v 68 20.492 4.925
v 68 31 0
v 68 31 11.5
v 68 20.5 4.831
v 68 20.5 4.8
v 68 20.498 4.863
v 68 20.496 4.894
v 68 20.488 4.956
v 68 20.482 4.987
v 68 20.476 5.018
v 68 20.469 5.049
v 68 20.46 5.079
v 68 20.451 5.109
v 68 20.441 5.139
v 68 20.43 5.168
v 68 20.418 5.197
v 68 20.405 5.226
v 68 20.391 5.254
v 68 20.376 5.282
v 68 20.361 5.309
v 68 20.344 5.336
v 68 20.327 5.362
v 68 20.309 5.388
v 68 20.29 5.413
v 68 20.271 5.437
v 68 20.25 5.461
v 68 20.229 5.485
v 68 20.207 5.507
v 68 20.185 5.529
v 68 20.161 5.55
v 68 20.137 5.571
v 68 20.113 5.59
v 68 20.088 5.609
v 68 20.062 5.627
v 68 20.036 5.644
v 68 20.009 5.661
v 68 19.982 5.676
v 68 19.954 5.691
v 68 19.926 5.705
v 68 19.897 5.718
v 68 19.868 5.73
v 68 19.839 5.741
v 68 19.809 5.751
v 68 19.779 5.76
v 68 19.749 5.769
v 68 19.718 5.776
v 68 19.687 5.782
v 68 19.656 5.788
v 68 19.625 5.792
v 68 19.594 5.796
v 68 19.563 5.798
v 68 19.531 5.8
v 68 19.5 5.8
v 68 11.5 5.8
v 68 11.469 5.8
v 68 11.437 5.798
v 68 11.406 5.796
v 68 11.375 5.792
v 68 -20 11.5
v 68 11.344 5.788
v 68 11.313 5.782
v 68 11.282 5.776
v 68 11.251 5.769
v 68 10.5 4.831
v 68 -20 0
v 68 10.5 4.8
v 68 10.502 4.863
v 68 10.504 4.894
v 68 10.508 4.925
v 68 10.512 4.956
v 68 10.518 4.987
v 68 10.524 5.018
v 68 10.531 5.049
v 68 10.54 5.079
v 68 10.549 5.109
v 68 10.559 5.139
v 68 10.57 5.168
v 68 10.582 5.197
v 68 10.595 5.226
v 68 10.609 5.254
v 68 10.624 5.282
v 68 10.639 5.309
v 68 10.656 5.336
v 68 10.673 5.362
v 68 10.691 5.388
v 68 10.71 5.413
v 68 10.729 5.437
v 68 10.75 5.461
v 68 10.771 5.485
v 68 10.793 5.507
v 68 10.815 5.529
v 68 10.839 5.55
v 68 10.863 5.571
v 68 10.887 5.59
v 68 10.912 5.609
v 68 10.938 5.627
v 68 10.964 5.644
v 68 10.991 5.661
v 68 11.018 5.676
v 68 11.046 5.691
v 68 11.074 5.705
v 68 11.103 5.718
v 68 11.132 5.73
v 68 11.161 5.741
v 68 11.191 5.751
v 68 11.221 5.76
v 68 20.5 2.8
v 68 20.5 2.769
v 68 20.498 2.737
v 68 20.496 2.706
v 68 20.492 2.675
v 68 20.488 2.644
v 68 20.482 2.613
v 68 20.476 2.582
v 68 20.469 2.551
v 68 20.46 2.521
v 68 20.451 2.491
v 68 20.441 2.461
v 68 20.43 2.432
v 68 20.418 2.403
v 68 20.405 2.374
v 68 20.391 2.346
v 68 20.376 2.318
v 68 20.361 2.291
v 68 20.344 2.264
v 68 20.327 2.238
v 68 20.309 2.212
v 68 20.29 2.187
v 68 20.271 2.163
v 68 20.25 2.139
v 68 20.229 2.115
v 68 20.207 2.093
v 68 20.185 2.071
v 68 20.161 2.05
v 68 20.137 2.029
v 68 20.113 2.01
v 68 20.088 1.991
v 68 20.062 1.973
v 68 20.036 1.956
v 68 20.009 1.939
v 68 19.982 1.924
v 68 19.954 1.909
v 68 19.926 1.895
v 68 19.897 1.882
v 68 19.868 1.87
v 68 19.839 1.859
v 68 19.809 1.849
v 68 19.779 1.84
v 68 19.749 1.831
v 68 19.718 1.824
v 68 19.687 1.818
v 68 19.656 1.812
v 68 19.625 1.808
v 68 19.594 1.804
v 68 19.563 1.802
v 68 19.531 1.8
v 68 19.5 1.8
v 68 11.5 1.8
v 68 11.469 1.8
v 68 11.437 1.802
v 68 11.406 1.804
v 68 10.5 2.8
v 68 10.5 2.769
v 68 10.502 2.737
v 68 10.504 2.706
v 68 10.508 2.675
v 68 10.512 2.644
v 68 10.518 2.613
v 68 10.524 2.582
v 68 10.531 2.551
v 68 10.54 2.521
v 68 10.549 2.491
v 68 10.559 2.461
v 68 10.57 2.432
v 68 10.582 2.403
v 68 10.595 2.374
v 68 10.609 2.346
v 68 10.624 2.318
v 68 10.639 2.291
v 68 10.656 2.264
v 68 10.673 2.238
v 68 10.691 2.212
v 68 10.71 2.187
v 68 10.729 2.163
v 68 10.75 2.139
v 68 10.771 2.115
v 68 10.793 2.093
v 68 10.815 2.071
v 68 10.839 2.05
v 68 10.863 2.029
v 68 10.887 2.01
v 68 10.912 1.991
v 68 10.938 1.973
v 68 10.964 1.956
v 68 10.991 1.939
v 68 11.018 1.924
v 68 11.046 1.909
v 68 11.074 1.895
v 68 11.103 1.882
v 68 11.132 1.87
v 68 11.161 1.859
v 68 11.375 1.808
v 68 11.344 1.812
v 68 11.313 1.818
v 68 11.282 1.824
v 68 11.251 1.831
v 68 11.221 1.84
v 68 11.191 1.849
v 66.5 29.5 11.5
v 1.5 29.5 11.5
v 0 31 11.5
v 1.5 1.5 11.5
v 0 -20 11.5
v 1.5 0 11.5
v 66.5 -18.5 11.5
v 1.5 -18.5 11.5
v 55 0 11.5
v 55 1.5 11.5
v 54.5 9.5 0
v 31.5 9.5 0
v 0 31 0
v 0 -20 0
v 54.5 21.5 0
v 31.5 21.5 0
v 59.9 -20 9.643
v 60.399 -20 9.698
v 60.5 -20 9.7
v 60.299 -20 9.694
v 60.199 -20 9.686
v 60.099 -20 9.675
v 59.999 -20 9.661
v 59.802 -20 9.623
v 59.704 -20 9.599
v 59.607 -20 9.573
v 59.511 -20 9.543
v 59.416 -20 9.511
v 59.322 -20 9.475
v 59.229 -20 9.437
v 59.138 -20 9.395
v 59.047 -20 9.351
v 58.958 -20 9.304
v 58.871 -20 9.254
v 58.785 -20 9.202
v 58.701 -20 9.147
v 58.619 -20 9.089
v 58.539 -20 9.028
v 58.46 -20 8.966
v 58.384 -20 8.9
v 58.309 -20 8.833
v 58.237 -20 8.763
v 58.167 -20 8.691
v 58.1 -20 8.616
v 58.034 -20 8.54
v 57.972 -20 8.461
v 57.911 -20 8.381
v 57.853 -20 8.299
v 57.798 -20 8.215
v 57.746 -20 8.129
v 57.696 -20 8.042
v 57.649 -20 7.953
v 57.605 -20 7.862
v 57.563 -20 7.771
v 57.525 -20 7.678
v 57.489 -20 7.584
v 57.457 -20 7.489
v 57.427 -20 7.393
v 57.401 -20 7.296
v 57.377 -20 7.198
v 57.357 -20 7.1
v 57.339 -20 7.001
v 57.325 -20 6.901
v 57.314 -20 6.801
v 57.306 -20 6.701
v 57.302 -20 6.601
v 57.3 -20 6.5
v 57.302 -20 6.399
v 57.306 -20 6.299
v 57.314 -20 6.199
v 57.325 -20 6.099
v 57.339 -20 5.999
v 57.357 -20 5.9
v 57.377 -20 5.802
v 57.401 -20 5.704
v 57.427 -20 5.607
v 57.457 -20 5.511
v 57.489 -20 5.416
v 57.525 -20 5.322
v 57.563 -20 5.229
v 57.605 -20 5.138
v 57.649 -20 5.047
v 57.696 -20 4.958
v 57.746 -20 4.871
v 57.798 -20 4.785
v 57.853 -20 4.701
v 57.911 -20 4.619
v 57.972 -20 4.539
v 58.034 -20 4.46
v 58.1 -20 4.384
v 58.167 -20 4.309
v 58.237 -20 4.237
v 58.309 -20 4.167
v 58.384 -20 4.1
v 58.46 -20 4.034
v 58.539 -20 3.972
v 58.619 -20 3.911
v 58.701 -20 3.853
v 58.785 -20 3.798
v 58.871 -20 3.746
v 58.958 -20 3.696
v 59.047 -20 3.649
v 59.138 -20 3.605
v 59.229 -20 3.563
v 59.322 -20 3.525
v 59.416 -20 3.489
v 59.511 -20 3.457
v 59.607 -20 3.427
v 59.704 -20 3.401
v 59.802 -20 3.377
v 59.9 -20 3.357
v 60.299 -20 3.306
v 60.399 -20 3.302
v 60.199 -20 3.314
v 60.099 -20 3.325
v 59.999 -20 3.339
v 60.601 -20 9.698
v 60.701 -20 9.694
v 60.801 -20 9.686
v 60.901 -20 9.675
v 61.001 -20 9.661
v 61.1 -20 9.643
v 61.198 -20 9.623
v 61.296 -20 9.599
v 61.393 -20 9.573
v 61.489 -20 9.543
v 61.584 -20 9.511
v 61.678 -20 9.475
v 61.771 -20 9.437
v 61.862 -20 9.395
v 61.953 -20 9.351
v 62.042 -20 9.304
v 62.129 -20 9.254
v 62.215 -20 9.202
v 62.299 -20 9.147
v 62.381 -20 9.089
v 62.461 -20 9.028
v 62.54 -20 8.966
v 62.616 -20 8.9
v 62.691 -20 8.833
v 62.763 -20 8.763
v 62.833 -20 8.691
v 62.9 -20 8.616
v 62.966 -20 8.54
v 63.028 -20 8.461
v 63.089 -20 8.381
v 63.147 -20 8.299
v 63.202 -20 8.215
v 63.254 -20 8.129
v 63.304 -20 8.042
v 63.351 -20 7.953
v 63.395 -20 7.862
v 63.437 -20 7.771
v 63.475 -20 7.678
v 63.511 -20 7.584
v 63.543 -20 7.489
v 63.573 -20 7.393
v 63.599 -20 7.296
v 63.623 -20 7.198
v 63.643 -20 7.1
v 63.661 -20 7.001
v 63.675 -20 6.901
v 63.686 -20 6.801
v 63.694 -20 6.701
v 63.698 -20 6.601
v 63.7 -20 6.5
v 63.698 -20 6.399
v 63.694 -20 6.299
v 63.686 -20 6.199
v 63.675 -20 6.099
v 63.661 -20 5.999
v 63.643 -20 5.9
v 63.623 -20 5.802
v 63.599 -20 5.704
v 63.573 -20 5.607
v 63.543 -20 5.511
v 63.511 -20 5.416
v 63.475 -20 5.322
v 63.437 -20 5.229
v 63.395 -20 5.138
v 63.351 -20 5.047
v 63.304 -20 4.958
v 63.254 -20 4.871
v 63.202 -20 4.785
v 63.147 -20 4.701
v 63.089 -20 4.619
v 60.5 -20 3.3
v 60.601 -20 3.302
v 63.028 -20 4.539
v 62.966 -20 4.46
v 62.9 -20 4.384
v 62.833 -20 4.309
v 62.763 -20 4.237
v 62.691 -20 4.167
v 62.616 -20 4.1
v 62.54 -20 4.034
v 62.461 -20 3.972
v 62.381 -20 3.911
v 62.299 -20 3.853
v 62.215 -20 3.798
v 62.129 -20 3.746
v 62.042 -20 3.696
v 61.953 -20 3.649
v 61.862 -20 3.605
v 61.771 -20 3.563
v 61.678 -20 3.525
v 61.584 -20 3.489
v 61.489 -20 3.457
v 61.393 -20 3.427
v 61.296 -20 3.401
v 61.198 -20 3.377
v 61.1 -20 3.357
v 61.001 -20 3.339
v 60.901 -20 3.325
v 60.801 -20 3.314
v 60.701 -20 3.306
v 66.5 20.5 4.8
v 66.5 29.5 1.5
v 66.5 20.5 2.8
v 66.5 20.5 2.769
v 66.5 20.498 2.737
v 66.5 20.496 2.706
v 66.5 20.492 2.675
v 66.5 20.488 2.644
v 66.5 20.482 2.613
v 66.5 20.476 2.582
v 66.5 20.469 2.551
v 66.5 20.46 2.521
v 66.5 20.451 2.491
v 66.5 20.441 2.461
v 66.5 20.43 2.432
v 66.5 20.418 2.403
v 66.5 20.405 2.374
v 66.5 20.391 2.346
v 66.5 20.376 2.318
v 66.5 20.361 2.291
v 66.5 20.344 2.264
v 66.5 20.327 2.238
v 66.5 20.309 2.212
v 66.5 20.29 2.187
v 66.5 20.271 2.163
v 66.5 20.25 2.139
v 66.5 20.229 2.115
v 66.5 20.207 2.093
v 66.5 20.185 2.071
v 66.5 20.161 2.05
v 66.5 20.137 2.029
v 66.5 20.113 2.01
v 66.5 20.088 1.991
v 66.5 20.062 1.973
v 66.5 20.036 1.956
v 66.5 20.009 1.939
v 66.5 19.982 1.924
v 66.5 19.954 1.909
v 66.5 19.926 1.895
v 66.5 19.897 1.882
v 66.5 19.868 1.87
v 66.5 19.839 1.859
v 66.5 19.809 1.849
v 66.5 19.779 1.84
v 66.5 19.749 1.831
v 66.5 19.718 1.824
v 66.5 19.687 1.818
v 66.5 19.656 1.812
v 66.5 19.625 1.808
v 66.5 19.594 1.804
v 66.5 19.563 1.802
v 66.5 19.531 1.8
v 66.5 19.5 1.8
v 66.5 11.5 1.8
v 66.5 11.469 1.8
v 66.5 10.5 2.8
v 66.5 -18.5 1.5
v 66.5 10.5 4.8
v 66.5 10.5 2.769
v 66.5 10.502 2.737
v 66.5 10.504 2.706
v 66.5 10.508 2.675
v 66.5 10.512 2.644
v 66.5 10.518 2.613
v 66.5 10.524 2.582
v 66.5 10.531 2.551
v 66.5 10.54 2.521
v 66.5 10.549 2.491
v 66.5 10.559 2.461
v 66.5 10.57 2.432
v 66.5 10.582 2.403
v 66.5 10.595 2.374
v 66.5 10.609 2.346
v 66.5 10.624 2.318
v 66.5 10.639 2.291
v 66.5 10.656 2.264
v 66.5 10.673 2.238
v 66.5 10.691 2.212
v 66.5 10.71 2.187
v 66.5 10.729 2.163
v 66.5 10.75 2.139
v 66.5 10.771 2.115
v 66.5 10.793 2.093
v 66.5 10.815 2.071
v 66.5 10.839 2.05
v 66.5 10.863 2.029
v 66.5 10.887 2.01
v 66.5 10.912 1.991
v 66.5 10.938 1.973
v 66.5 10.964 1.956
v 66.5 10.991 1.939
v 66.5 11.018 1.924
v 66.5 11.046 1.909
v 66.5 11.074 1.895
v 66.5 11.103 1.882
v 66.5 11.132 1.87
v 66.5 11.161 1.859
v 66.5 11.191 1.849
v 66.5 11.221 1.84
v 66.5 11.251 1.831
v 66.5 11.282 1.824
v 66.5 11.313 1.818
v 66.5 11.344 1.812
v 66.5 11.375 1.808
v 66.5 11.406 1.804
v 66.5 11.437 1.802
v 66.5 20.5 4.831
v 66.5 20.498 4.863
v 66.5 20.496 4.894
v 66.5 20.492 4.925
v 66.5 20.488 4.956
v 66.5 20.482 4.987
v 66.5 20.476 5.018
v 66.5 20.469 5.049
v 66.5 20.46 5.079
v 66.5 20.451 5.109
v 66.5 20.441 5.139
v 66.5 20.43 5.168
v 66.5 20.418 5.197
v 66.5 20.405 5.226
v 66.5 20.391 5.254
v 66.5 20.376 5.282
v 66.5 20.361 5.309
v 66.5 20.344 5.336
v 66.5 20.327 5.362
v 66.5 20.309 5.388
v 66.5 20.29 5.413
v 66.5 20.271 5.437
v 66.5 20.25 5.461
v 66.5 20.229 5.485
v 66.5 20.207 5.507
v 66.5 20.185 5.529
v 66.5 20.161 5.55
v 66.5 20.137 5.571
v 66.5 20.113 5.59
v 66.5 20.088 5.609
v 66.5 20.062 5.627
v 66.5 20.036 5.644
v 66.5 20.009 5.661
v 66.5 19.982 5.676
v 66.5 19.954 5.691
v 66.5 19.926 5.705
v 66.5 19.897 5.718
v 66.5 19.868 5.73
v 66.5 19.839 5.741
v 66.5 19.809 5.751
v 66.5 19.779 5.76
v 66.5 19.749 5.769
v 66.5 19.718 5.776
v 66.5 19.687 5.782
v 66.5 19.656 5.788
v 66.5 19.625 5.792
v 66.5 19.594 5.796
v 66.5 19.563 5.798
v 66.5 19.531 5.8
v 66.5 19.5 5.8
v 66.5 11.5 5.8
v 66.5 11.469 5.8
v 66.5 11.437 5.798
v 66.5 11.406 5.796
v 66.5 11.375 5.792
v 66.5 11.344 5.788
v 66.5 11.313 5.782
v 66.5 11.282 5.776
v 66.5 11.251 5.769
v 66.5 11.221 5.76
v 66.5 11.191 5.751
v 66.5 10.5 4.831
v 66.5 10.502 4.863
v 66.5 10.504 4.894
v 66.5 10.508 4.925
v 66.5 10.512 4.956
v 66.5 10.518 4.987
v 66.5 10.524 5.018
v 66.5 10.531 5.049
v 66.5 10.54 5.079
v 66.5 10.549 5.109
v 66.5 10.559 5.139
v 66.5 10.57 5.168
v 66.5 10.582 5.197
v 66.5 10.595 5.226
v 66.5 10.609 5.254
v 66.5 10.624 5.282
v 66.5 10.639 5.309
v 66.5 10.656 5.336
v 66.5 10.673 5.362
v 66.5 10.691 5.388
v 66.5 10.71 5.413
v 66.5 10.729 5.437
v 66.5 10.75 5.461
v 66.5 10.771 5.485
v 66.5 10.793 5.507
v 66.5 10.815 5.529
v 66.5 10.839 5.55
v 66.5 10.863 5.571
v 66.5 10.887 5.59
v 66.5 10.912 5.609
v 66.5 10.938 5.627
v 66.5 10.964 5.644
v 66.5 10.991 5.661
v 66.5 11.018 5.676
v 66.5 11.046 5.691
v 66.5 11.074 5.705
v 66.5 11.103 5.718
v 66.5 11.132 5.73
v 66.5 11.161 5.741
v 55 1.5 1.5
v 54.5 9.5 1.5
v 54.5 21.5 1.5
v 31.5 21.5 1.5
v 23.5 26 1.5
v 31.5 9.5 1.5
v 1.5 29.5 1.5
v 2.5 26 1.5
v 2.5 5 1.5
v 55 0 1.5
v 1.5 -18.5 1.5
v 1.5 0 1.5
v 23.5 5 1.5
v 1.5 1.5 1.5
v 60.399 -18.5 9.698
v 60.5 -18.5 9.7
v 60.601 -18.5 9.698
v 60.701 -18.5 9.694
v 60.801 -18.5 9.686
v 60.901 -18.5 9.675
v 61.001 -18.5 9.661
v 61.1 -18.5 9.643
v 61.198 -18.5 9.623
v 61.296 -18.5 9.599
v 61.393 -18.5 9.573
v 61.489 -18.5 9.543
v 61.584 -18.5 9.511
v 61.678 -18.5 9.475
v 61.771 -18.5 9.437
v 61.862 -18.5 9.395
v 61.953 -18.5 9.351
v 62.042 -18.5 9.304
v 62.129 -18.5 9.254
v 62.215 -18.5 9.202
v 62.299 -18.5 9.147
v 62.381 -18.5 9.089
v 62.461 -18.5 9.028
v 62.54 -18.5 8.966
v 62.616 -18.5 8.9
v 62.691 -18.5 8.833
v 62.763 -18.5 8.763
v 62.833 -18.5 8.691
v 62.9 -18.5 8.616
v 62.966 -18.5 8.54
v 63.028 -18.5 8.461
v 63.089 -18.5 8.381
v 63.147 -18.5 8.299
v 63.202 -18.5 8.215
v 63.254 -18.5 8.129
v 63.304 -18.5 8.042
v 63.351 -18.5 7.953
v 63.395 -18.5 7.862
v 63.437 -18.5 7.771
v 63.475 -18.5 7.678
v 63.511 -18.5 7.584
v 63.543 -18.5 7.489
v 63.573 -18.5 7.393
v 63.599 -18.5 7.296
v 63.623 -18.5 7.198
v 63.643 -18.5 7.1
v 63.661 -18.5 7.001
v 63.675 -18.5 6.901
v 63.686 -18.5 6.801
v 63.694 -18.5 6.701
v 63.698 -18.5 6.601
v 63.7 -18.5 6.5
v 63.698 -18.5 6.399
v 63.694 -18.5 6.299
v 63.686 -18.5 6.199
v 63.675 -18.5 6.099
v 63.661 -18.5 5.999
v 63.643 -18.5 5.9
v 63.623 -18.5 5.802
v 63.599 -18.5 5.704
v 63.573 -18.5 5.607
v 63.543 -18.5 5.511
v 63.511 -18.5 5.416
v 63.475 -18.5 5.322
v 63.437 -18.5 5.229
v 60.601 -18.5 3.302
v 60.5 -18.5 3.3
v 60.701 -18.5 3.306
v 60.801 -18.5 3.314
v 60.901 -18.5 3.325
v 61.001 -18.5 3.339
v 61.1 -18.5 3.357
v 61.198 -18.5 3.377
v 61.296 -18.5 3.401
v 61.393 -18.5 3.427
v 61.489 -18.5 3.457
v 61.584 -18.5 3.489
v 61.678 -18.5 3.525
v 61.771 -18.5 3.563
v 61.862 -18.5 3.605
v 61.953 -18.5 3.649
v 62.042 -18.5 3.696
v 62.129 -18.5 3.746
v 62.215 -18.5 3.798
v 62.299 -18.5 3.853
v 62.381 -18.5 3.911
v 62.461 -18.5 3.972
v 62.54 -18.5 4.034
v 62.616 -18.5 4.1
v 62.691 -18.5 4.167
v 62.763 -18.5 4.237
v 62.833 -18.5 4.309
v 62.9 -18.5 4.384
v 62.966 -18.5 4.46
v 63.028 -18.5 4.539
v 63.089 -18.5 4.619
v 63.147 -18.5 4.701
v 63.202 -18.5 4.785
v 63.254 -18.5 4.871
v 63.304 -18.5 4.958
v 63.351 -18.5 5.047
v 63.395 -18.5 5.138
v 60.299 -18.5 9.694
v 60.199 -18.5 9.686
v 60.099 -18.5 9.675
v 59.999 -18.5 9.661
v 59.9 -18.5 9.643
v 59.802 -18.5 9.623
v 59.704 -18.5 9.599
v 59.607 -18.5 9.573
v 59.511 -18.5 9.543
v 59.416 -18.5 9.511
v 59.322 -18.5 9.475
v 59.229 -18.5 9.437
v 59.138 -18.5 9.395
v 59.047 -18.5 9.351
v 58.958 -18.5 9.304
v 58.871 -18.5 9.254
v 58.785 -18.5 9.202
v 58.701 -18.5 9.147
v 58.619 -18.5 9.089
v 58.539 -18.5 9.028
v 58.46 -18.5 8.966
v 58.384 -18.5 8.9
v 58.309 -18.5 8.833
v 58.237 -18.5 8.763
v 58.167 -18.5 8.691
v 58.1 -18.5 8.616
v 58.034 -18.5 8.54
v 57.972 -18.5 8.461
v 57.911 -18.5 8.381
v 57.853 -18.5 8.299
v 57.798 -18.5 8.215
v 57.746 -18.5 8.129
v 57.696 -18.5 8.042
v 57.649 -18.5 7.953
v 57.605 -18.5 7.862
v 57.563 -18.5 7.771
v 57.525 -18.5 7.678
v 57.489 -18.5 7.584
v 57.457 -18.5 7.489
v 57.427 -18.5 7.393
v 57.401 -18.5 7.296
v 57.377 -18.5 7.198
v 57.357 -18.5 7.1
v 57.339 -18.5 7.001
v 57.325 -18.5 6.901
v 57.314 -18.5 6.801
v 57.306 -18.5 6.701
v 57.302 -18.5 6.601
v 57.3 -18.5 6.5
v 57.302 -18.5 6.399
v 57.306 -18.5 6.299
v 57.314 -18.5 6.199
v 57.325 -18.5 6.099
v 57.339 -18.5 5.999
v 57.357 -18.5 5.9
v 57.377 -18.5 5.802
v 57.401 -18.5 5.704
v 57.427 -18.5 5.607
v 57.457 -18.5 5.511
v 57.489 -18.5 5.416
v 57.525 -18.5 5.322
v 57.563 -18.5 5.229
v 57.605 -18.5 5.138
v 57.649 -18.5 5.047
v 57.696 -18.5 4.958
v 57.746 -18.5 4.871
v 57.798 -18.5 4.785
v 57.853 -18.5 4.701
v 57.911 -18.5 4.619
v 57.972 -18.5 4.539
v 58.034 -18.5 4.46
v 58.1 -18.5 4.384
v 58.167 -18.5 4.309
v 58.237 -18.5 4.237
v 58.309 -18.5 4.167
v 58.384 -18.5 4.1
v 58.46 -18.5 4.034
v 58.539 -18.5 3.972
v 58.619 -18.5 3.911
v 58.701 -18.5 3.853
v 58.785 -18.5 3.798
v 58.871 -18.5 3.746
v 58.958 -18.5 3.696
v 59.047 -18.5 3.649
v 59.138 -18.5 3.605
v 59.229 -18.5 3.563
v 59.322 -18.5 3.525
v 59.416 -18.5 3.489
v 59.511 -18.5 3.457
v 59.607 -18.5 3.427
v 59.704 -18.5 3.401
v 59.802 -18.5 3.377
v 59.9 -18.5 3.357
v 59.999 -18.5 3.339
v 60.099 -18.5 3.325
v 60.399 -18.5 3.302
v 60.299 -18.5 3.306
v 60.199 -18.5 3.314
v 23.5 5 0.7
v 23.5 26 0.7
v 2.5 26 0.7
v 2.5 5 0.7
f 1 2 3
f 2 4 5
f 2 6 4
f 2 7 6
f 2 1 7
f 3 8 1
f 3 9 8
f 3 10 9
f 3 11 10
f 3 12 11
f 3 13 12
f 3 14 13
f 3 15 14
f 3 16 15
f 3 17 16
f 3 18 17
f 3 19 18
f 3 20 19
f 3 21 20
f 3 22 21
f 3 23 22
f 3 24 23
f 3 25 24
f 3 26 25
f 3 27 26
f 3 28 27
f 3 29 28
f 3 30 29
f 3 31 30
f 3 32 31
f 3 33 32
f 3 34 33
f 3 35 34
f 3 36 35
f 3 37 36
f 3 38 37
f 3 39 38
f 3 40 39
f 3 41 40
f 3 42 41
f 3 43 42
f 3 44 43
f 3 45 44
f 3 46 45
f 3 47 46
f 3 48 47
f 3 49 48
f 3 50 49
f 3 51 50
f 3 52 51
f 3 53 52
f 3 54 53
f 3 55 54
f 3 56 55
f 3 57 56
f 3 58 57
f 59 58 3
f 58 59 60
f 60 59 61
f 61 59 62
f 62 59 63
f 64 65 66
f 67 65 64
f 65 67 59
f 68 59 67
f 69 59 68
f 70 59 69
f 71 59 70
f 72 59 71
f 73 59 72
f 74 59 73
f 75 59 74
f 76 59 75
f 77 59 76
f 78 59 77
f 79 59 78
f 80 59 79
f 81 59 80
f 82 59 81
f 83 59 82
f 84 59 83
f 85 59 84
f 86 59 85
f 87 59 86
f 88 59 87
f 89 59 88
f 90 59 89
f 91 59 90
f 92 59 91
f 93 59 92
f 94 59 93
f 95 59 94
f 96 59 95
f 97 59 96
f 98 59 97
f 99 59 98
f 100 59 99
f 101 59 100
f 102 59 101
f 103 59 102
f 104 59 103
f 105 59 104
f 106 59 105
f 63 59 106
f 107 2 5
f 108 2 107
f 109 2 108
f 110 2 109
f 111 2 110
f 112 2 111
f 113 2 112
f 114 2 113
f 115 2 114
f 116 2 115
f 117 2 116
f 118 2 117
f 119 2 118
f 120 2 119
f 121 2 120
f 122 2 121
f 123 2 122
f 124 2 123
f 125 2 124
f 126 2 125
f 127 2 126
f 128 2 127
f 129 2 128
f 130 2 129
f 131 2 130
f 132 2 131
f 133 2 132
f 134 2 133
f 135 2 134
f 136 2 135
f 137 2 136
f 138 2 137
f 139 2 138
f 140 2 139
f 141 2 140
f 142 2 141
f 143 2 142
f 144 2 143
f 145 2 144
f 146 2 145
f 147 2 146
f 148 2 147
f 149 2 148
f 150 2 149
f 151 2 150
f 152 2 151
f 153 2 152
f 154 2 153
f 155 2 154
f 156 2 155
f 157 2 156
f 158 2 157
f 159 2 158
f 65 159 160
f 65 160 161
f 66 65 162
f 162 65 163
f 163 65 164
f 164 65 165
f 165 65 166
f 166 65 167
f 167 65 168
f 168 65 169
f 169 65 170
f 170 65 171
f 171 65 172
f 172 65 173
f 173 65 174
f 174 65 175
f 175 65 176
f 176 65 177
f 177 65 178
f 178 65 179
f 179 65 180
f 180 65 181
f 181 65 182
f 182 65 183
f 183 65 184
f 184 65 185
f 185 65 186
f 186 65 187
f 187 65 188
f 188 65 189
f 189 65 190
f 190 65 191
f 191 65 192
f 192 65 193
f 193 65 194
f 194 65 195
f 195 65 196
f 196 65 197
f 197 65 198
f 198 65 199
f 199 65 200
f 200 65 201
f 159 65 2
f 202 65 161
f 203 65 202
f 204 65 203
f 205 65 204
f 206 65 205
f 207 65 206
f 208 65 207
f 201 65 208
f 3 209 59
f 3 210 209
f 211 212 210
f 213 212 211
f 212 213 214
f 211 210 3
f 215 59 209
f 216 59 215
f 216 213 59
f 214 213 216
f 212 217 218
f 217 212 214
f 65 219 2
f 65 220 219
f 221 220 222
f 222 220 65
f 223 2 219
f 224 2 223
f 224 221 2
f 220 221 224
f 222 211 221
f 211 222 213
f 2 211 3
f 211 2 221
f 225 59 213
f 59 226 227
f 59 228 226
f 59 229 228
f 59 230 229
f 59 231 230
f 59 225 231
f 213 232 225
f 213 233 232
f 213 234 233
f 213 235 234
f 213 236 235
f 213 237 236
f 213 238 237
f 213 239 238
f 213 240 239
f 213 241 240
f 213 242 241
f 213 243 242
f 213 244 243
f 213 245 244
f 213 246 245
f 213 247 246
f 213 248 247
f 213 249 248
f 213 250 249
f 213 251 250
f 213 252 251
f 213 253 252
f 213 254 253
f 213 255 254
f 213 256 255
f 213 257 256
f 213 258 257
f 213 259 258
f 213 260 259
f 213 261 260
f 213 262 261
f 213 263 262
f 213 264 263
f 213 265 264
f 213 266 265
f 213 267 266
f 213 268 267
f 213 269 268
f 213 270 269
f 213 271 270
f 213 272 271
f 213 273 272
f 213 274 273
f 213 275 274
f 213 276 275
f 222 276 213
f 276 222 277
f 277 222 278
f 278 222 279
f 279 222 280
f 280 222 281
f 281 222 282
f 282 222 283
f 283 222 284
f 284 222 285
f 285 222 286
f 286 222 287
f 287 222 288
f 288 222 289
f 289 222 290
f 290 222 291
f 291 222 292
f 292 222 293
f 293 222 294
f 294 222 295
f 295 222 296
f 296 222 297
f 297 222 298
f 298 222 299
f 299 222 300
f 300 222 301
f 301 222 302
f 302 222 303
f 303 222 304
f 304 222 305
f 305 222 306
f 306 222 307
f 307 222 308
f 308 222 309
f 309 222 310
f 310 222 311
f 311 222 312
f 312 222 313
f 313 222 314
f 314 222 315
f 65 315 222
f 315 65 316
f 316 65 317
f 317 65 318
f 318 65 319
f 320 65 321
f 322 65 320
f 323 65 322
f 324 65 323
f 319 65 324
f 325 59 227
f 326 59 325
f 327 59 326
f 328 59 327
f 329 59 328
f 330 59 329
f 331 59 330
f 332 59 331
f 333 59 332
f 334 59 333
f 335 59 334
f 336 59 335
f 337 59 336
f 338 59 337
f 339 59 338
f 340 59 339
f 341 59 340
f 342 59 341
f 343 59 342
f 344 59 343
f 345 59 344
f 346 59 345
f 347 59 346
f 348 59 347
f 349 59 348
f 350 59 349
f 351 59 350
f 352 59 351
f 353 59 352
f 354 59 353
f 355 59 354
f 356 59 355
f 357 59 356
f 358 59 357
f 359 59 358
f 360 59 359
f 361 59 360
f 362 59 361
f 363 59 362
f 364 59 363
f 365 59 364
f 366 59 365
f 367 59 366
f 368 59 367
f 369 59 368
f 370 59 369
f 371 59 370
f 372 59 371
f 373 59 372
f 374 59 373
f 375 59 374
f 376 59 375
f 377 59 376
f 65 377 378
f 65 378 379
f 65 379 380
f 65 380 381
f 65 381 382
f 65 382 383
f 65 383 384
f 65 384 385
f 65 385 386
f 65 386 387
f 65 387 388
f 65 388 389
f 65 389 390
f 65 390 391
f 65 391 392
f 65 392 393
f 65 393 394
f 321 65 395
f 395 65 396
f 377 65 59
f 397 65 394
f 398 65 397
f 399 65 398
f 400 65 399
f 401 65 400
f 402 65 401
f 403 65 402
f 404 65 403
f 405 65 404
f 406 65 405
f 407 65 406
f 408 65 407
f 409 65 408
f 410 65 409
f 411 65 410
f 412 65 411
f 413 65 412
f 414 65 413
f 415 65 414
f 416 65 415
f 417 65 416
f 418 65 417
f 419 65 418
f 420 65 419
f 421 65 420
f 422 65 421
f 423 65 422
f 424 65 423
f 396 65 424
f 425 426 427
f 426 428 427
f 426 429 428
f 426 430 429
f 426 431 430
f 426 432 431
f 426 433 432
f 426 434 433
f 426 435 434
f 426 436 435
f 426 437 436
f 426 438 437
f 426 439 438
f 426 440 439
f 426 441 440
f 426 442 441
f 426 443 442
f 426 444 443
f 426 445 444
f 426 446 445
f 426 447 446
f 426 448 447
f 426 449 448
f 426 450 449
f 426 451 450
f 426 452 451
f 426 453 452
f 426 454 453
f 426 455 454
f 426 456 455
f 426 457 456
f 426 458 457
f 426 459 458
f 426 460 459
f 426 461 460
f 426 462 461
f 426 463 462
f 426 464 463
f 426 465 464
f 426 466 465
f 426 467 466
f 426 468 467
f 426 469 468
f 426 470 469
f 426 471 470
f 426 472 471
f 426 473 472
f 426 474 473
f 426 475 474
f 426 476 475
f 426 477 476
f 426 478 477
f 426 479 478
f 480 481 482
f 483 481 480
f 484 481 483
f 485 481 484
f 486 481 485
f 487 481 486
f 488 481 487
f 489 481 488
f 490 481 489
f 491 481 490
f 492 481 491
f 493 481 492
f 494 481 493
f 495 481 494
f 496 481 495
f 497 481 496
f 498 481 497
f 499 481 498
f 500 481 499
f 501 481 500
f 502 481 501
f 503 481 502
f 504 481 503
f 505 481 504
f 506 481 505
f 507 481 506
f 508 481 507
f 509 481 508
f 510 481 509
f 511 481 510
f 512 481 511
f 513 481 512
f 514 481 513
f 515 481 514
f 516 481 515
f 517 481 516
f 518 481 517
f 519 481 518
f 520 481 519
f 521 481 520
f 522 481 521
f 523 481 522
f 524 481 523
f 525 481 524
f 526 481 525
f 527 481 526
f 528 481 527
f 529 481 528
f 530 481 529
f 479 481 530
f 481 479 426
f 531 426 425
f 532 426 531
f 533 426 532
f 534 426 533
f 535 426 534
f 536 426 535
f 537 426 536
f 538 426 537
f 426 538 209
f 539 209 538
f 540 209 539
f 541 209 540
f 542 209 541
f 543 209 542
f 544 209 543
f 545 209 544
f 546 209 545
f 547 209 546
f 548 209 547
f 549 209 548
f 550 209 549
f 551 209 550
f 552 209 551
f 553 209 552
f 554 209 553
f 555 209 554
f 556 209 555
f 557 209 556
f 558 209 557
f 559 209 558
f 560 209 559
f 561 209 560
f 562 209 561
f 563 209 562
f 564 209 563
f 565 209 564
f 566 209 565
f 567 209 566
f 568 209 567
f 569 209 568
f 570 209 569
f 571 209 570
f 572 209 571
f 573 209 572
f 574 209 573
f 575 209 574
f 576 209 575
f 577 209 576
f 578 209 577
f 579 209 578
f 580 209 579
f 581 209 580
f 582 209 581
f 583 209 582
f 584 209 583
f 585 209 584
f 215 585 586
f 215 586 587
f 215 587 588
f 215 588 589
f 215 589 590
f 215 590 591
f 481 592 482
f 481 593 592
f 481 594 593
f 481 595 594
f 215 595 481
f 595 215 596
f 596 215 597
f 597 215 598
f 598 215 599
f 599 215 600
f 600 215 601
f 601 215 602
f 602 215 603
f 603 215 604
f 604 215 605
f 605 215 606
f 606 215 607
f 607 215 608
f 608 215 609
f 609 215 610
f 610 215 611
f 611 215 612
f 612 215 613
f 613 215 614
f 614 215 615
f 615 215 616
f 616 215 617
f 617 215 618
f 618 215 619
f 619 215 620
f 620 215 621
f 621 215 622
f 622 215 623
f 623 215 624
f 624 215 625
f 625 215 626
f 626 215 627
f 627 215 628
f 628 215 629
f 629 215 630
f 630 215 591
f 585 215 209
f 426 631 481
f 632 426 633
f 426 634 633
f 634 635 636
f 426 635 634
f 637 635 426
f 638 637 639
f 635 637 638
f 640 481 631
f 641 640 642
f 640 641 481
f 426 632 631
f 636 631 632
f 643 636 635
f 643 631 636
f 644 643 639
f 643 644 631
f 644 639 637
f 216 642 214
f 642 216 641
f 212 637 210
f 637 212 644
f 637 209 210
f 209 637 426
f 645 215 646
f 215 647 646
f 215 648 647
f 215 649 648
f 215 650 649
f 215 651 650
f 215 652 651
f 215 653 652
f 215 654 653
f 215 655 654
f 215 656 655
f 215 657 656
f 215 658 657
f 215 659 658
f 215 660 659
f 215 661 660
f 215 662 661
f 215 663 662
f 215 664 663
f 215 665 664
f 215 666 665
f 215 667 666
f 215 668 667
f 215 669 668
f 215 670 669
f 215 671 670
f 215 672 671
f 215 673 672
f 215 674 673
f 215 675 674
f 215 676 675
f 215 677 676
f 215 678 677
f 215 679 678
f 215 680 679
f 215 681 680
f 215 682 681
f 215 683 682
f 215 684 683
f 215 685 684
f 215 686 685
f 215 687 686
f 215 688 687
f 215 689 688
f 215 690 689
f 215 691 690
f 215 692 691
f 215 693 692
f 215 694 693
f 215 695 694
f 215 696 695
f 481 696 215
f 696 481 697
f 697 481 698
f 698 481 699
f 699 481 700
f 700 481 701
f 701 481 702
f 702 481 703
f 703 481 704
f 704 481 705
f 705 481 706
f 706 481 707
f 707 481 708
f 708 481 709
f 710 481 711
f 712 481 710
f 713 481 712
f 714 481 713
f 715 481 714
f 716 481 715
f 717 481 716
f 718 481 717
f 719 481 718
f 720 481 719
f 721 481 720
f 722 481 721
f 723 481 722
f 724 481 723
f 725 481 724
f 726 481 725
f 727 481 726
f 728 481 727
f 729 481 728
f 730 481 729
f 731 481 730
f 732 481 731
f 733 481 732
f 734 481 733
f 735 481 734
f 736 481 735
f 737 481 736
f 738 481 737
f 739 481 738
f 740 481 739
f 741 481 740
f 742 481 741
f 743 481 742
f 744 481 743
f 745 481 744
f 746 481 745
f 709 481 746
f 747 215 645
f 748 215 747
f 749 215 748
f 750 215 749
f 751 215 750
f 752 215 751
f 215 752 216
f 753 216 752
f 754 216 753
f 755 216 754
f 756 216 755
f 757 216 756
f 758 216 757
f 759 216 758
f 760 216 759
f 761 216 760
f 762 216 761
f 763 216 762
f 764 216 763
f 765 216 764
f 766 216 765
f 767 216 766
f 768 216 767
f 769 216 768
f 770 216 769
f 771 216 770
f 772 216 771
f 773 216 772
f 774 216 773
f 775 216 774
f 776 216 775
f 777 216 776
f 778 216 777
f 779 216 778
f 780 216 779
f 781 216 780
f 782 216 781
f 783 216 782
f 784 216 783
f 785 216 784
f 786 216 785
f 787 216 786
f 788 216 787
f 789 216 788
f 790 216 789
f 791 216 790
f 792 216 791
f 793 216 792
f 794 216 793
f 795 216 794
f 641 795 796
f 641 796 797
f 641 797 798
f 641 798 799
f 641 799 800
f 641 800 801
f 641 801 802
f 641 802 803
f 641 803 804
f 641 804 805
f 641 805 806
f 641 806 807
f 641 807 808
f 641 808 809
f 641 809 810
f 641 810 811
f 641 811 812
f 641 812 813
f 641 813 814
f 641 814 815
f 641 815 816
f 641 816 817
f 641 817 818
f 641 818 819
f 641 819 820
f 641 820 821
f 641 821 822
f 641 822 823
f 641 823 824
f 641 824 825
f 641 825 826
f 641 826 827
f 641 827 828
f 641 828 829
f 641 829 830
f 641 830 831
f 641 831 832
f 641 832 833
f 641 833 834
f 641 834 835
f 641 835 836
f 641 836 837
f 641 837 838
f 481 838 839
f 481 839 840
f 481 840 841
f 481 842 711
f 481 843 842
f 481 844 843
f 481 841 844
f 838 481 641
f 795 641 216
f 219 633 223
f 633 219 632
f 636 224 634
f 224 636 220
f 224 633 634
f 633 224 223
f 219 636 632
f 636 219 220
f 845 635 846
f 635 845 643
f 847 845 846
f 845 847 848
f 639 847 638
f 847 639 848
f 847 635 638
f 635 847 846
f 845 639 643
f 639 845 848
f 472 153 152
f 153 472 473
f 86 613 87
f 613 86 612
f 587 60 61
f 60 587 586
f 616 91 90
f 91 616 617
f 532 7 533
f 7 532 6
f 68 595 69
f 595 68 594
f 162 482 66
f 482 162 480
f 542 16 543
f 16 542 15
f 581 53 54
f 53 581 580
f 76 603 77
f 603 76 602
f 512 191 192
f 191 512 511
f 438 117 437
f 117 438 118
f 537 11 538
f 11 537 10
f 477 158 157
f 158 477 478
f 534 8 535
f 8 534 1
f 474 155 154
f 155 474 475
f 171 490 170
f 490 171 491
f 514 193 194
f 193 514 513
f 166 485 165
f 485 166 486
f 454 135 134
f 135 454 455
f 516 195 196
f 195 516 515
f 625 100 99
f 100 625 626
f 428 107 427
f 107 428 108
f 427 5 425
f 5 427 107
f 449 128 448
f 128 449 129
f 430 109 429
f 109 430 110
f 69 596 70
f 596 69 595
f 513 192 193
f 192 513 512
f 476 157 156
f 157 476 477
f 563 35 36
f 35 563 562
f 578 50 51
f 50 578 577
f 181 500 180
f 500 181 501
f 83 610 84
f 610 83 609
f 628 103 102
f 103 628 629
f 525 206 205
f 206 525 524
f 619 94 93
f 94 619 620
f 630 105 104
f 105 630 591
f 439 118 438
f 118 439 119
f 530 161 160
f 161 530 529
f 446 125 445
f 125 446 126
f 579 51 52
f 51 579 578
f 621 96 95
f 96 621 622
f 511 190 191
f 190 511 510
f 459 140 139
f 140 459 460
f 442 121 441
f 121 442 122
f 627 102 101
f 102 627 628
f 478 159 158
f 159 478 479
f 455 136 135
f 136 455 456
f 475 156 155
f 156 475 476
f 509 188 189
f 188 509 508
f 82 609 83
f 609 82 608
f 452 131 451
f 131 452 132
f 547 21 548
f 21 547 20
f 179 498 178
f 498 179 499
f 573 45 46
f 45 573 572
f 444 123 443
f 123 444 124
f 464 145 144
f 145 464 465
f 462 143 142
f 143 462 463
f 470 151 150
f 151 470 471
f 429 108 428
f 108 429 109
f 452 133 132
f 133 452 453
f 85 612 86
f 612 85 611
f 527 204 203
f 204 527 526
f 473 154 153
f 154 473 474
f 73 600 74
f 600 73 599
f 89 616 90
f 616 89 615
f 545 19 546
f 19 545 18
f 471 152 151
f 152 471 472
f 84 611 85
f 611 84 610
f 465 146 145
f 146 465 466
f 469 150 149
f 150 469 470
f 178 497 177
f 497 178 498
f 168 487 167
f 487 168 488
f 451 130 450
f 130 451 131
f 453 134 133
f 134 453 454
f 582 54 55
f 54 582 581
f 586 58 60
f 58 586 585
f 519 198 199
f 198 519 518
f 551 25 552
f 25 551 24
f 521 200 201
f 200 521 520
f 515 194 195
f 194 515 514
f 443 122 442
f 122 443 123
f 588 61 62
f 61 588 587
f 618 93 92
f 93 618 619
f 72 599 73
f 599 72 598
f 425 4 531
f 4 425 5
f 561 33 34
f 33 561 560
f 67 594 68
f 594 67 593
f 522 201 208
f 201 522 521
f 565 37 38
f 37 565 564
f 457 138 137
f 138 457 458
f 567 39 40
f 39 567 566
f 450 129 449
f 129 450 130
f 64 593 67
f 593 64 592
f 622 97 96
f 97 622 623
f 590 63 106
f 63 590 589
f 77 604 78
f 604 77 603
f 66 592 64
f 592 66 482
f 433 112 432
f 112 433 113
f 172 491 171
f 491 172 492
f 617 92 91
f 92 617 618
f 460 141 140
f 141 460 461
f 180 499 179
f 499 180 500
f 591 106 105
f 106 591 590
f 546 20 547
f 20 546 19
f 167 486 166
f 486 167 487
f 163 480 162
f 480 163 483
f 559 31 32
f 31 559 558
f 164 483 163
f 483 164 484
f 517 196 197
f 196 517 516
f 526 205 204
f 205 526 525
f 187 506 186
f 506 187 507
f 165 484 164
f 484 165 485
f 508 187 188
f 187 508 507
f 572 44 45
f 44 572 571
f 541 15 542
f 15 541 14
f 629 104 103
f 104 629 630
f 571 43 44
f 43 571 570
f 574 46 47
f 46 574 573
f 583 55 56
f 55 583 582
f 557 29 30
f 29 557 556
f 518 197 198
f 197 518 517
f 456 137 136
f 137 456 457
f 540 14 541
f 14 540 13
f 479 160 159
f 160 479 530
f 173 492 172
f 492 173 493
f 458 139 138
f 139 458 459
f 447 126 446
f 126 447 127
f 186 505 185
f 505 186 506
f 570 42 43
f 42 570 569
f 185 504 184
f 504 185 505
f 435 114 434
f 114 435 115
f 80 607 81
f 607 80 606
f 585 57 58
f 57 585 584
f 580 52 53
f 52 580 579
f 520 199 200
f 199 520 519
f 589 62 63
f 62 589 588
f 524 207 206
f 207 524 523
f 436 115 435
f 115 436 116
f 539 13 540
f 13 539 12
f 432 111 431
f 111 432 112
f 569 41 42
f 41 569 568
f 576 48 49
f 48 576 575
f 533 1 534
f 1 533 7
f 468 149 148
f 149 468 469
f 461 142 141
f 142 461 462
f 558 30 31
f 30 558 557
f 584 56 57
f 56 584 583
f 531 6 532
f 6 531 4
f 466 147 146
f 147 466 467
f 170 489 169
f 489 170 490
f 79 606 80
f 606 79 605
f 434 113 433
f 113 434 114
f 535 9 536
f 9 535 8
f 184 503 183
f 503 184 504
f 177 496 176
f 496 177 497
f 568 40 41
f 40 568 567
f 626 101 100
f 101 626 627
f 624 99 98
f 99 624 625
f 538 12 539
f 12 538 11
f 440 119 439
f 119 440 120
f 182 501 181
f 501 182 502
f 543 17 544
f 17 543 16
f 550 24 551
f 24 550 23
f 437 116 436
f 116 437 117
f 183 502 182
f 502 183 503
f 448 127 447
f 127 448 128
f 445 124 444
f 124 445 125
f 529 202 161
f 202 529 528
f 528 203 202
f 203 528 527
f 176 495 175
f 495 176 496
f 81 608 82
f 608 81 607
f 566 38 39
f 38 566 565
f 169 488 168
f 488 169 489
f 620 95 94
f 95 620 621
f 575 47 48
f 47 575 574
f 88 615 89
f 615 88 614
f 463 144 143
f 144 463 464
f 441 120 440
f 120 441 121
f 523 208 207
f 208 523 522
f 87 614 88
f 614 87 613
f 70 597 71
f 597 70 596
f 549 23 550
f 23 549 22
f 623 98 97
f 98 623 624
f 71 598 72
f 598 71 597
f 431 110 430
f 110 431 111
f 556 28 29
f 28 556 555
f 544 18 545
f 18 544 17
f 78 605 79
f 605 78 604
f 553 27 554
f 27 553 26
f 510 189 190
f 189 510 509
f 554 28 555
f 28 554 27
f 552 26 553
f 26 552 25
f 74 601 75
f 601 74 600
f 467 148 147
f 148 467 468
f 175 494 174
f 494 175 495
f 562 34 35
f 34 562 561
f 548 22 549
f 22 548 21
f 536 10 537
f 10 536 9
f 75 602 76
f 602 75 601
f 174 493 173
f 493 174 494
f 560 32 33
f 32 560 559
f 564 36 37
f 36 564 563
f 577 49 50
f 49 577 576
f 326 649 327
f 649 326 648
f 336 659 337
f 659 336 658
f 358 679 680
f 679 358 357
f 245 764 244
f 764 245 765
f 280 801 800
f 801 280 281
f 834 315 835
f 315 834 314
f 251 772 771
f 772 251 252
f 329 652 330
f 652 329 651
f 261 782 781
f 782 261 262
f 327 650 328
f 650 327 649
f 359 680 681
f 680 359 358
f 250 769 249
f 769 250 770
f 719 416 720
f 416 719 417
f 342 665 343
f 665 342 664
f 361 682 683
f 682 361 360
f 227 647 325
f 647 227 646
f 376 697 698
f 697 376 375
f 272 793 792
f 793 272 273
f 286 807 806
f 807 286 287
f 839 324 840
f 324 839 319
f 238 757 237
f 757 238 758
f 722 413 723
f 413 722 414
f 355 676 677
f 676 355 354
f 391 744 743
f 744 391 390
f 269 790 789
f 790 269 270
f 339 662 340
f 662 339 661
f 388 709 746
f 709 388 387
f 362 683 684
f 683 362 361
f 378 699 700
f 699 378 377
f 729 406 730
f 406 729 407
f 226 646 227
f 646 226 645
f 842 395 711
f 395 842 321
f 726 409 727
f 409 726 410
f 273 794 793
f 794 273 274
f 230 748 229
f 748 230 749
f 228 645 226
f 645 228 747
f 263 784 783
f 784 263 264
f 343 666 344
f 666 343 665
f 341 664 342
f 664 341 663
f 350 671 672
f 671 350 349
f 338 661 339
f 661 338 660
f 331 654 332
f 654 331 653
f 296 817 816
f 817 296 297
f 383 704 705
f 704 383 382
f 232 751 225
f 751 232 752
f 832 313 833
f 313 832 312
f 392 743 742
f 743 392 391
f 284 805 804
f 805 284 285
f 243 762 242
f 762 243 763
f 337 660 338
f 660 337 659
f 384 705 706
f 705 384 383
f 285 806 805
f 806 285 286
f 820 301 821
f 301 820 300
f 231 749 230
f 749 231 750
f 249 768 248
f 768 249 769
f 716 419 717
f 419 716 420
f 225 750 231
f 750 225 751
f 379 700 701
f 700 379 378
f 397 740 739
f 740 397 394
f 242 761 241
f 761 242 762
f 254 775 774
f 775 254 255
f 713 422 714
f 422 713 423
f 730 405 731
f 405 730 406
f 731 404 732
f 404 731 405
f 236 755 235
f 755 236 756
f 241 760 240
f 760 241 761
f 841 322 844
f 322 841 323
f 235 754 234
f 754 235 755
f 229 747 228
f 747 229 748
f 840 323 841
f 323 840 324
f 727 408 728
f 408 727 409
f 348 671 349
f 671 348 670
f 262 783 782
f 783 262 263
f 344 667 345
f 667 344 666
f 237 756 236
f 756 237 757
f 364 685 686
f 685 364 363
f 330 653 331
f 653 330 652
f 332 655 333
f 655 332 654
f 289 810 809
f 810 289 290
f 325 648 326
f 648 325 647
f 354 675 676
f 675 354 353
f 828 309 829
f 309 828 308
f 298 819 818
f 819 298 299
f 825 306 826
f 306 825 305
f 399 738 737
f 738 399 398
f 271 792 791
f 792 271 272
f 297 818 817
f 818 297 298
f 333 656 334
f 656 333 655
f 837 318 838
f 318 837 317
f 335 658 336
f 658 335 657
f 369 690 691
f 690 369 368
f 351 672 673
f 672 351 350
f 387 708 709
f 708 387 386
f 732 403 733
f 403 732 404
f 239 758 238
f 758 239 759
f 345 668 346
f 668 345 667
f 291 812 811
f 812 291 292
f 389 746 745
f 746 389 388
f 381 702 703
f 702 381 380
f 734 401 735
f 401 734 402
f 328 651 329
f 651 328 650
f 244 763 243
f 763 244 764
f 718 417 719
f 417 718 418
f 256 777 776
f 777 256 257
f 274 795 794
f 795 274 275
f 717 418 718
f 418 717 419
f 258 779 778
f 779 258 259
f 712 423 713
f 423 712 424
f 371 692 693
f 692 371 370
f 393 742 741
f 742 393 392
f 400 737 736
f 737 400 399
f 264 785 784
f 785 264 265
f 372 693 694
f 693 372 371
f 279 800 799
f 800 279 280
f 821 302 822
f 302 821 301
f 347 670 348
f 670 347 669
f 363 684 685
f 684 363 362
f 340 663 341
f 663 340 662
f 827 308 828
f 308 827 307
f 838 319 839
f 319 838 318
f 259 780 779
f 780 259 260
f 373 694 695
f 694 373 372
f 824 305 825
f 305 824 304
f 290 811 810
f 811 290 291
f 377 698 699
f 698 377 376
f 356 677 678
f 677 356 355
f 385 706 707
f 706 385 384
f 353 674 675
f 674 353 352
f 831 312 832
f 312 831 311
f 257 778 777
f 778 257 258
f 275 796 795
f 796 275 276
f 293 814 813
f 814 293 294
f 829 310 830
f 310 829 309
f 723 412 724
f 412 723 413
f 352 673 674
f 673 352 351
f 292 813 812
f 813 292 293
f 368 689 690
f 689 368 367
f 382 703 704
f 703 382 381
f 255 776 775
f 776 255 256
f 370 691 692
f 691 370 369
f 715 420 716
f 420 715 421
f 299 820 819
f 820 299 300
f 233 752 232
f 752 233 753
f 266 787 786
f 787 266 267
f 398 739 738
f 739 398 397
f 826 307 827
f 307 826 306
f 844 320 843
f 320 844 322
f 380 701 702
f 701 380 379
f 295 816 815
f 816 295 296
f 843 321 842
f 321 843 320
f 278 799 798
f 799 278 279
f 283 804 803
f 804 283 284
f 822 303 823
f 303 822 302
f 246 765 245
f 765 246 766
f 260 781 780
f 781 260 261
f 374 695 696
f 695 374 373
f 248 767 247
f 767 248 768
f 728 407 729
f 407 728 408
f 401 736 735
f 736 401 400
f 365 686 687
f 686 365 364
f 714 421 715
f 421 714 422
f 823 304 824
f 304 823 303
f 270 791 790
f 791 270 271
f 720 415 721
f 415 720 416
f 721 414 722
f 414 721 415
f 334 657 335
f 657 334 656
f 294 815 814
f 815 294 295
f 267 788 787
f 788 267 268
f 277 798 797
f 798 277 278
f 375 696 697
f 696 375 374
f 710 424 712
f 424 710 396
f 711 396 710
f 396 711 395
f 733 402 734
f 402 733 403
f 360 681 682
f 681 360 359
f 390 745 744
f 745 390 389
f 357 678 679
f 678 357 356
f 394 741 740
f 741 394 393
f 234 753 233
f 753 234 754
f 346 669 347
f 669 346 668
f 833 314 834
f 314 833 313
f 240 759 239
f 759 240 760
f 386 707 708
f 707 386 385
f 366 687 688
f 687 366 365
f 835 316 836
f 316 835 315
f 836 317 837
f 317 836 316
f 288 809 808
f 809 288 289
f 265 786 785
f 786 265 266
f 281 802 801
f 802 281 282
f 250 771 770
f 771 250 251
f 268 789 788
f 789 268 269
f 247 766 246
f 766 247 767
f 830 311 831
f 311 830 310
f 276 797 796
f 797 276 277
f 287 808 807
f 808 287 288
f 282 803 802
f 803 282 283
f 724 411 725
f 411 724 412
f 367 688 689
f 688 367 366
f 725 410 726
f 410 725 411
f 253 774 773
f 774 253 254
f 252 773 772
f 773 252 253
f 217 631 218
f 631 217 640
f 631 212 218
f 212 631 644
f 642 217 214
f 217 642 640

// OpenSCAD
thickness = 1.5;

$fn = 200;

module top () {
    difference() {
        translate([0, -20, 0])
            cube([65+(thickness*2), 20+28+(thickness*2), 10+thickness]);
        
        translate([0, -20, 0])
        translate([thickness, thickness, thickness])
            cube([65, 20+28, 12+thickness]);
        
        // Cutout for OLED
        translate([30+thickness, 8+thickness, -0.1])
            cube([23, 12, thickness+0.2]);
        
        // Partial depth cutour for GPS antenna
        translate([1+thickness, 4-0.5+thickness, thickness-0.8])
            cube([21, 21, 0.9]);
        
        // Cutout for USB-C connector
        translate([65+thickness-0.1, 9+thickness, 1.3+thickness])
            rotate([0, 90, 0])
            translate([-2, 1, 0])
            minkowski () {
                cube([4-2, 10-2, 3]);
                cylinder(4, 1, 1);
            }
            
        // SMA connector
        translate([59+thickness, -20-0.1, 5+thickness])
            rotate([-90, -90, 0])
            cylinder(thickness+0.2, 3.2, 3.2);
    }
    
    // Board / Battery separator
    translate([0, 0, thickness])
    cube([55, thickness, 10]);
}

module bottom () {
    //Lid 
    translate([0, -20, 10+thickness])
        cube([65+(thickness*2), 20+28+(thickness*2), thickness]);
    
    // Board pushers
    translate([thickness+0.1, -20+thickness+0.1, 5.2+thickness])
    cube([55-thickness+0.1, thickness, 4.8+thickness]);
    translate([thickness+0.1, thickness+0.1, 5.2+thickness])
    cube([55-thickness-0.1, thickness, 4.8+thickness]);
    translate([thickness+0.1, 28-0.1, 5.2+thickness])
    cube([68-(thickness*2)-0.2, thickness, 4.8+thickness]);
}

top();
//bottom();
